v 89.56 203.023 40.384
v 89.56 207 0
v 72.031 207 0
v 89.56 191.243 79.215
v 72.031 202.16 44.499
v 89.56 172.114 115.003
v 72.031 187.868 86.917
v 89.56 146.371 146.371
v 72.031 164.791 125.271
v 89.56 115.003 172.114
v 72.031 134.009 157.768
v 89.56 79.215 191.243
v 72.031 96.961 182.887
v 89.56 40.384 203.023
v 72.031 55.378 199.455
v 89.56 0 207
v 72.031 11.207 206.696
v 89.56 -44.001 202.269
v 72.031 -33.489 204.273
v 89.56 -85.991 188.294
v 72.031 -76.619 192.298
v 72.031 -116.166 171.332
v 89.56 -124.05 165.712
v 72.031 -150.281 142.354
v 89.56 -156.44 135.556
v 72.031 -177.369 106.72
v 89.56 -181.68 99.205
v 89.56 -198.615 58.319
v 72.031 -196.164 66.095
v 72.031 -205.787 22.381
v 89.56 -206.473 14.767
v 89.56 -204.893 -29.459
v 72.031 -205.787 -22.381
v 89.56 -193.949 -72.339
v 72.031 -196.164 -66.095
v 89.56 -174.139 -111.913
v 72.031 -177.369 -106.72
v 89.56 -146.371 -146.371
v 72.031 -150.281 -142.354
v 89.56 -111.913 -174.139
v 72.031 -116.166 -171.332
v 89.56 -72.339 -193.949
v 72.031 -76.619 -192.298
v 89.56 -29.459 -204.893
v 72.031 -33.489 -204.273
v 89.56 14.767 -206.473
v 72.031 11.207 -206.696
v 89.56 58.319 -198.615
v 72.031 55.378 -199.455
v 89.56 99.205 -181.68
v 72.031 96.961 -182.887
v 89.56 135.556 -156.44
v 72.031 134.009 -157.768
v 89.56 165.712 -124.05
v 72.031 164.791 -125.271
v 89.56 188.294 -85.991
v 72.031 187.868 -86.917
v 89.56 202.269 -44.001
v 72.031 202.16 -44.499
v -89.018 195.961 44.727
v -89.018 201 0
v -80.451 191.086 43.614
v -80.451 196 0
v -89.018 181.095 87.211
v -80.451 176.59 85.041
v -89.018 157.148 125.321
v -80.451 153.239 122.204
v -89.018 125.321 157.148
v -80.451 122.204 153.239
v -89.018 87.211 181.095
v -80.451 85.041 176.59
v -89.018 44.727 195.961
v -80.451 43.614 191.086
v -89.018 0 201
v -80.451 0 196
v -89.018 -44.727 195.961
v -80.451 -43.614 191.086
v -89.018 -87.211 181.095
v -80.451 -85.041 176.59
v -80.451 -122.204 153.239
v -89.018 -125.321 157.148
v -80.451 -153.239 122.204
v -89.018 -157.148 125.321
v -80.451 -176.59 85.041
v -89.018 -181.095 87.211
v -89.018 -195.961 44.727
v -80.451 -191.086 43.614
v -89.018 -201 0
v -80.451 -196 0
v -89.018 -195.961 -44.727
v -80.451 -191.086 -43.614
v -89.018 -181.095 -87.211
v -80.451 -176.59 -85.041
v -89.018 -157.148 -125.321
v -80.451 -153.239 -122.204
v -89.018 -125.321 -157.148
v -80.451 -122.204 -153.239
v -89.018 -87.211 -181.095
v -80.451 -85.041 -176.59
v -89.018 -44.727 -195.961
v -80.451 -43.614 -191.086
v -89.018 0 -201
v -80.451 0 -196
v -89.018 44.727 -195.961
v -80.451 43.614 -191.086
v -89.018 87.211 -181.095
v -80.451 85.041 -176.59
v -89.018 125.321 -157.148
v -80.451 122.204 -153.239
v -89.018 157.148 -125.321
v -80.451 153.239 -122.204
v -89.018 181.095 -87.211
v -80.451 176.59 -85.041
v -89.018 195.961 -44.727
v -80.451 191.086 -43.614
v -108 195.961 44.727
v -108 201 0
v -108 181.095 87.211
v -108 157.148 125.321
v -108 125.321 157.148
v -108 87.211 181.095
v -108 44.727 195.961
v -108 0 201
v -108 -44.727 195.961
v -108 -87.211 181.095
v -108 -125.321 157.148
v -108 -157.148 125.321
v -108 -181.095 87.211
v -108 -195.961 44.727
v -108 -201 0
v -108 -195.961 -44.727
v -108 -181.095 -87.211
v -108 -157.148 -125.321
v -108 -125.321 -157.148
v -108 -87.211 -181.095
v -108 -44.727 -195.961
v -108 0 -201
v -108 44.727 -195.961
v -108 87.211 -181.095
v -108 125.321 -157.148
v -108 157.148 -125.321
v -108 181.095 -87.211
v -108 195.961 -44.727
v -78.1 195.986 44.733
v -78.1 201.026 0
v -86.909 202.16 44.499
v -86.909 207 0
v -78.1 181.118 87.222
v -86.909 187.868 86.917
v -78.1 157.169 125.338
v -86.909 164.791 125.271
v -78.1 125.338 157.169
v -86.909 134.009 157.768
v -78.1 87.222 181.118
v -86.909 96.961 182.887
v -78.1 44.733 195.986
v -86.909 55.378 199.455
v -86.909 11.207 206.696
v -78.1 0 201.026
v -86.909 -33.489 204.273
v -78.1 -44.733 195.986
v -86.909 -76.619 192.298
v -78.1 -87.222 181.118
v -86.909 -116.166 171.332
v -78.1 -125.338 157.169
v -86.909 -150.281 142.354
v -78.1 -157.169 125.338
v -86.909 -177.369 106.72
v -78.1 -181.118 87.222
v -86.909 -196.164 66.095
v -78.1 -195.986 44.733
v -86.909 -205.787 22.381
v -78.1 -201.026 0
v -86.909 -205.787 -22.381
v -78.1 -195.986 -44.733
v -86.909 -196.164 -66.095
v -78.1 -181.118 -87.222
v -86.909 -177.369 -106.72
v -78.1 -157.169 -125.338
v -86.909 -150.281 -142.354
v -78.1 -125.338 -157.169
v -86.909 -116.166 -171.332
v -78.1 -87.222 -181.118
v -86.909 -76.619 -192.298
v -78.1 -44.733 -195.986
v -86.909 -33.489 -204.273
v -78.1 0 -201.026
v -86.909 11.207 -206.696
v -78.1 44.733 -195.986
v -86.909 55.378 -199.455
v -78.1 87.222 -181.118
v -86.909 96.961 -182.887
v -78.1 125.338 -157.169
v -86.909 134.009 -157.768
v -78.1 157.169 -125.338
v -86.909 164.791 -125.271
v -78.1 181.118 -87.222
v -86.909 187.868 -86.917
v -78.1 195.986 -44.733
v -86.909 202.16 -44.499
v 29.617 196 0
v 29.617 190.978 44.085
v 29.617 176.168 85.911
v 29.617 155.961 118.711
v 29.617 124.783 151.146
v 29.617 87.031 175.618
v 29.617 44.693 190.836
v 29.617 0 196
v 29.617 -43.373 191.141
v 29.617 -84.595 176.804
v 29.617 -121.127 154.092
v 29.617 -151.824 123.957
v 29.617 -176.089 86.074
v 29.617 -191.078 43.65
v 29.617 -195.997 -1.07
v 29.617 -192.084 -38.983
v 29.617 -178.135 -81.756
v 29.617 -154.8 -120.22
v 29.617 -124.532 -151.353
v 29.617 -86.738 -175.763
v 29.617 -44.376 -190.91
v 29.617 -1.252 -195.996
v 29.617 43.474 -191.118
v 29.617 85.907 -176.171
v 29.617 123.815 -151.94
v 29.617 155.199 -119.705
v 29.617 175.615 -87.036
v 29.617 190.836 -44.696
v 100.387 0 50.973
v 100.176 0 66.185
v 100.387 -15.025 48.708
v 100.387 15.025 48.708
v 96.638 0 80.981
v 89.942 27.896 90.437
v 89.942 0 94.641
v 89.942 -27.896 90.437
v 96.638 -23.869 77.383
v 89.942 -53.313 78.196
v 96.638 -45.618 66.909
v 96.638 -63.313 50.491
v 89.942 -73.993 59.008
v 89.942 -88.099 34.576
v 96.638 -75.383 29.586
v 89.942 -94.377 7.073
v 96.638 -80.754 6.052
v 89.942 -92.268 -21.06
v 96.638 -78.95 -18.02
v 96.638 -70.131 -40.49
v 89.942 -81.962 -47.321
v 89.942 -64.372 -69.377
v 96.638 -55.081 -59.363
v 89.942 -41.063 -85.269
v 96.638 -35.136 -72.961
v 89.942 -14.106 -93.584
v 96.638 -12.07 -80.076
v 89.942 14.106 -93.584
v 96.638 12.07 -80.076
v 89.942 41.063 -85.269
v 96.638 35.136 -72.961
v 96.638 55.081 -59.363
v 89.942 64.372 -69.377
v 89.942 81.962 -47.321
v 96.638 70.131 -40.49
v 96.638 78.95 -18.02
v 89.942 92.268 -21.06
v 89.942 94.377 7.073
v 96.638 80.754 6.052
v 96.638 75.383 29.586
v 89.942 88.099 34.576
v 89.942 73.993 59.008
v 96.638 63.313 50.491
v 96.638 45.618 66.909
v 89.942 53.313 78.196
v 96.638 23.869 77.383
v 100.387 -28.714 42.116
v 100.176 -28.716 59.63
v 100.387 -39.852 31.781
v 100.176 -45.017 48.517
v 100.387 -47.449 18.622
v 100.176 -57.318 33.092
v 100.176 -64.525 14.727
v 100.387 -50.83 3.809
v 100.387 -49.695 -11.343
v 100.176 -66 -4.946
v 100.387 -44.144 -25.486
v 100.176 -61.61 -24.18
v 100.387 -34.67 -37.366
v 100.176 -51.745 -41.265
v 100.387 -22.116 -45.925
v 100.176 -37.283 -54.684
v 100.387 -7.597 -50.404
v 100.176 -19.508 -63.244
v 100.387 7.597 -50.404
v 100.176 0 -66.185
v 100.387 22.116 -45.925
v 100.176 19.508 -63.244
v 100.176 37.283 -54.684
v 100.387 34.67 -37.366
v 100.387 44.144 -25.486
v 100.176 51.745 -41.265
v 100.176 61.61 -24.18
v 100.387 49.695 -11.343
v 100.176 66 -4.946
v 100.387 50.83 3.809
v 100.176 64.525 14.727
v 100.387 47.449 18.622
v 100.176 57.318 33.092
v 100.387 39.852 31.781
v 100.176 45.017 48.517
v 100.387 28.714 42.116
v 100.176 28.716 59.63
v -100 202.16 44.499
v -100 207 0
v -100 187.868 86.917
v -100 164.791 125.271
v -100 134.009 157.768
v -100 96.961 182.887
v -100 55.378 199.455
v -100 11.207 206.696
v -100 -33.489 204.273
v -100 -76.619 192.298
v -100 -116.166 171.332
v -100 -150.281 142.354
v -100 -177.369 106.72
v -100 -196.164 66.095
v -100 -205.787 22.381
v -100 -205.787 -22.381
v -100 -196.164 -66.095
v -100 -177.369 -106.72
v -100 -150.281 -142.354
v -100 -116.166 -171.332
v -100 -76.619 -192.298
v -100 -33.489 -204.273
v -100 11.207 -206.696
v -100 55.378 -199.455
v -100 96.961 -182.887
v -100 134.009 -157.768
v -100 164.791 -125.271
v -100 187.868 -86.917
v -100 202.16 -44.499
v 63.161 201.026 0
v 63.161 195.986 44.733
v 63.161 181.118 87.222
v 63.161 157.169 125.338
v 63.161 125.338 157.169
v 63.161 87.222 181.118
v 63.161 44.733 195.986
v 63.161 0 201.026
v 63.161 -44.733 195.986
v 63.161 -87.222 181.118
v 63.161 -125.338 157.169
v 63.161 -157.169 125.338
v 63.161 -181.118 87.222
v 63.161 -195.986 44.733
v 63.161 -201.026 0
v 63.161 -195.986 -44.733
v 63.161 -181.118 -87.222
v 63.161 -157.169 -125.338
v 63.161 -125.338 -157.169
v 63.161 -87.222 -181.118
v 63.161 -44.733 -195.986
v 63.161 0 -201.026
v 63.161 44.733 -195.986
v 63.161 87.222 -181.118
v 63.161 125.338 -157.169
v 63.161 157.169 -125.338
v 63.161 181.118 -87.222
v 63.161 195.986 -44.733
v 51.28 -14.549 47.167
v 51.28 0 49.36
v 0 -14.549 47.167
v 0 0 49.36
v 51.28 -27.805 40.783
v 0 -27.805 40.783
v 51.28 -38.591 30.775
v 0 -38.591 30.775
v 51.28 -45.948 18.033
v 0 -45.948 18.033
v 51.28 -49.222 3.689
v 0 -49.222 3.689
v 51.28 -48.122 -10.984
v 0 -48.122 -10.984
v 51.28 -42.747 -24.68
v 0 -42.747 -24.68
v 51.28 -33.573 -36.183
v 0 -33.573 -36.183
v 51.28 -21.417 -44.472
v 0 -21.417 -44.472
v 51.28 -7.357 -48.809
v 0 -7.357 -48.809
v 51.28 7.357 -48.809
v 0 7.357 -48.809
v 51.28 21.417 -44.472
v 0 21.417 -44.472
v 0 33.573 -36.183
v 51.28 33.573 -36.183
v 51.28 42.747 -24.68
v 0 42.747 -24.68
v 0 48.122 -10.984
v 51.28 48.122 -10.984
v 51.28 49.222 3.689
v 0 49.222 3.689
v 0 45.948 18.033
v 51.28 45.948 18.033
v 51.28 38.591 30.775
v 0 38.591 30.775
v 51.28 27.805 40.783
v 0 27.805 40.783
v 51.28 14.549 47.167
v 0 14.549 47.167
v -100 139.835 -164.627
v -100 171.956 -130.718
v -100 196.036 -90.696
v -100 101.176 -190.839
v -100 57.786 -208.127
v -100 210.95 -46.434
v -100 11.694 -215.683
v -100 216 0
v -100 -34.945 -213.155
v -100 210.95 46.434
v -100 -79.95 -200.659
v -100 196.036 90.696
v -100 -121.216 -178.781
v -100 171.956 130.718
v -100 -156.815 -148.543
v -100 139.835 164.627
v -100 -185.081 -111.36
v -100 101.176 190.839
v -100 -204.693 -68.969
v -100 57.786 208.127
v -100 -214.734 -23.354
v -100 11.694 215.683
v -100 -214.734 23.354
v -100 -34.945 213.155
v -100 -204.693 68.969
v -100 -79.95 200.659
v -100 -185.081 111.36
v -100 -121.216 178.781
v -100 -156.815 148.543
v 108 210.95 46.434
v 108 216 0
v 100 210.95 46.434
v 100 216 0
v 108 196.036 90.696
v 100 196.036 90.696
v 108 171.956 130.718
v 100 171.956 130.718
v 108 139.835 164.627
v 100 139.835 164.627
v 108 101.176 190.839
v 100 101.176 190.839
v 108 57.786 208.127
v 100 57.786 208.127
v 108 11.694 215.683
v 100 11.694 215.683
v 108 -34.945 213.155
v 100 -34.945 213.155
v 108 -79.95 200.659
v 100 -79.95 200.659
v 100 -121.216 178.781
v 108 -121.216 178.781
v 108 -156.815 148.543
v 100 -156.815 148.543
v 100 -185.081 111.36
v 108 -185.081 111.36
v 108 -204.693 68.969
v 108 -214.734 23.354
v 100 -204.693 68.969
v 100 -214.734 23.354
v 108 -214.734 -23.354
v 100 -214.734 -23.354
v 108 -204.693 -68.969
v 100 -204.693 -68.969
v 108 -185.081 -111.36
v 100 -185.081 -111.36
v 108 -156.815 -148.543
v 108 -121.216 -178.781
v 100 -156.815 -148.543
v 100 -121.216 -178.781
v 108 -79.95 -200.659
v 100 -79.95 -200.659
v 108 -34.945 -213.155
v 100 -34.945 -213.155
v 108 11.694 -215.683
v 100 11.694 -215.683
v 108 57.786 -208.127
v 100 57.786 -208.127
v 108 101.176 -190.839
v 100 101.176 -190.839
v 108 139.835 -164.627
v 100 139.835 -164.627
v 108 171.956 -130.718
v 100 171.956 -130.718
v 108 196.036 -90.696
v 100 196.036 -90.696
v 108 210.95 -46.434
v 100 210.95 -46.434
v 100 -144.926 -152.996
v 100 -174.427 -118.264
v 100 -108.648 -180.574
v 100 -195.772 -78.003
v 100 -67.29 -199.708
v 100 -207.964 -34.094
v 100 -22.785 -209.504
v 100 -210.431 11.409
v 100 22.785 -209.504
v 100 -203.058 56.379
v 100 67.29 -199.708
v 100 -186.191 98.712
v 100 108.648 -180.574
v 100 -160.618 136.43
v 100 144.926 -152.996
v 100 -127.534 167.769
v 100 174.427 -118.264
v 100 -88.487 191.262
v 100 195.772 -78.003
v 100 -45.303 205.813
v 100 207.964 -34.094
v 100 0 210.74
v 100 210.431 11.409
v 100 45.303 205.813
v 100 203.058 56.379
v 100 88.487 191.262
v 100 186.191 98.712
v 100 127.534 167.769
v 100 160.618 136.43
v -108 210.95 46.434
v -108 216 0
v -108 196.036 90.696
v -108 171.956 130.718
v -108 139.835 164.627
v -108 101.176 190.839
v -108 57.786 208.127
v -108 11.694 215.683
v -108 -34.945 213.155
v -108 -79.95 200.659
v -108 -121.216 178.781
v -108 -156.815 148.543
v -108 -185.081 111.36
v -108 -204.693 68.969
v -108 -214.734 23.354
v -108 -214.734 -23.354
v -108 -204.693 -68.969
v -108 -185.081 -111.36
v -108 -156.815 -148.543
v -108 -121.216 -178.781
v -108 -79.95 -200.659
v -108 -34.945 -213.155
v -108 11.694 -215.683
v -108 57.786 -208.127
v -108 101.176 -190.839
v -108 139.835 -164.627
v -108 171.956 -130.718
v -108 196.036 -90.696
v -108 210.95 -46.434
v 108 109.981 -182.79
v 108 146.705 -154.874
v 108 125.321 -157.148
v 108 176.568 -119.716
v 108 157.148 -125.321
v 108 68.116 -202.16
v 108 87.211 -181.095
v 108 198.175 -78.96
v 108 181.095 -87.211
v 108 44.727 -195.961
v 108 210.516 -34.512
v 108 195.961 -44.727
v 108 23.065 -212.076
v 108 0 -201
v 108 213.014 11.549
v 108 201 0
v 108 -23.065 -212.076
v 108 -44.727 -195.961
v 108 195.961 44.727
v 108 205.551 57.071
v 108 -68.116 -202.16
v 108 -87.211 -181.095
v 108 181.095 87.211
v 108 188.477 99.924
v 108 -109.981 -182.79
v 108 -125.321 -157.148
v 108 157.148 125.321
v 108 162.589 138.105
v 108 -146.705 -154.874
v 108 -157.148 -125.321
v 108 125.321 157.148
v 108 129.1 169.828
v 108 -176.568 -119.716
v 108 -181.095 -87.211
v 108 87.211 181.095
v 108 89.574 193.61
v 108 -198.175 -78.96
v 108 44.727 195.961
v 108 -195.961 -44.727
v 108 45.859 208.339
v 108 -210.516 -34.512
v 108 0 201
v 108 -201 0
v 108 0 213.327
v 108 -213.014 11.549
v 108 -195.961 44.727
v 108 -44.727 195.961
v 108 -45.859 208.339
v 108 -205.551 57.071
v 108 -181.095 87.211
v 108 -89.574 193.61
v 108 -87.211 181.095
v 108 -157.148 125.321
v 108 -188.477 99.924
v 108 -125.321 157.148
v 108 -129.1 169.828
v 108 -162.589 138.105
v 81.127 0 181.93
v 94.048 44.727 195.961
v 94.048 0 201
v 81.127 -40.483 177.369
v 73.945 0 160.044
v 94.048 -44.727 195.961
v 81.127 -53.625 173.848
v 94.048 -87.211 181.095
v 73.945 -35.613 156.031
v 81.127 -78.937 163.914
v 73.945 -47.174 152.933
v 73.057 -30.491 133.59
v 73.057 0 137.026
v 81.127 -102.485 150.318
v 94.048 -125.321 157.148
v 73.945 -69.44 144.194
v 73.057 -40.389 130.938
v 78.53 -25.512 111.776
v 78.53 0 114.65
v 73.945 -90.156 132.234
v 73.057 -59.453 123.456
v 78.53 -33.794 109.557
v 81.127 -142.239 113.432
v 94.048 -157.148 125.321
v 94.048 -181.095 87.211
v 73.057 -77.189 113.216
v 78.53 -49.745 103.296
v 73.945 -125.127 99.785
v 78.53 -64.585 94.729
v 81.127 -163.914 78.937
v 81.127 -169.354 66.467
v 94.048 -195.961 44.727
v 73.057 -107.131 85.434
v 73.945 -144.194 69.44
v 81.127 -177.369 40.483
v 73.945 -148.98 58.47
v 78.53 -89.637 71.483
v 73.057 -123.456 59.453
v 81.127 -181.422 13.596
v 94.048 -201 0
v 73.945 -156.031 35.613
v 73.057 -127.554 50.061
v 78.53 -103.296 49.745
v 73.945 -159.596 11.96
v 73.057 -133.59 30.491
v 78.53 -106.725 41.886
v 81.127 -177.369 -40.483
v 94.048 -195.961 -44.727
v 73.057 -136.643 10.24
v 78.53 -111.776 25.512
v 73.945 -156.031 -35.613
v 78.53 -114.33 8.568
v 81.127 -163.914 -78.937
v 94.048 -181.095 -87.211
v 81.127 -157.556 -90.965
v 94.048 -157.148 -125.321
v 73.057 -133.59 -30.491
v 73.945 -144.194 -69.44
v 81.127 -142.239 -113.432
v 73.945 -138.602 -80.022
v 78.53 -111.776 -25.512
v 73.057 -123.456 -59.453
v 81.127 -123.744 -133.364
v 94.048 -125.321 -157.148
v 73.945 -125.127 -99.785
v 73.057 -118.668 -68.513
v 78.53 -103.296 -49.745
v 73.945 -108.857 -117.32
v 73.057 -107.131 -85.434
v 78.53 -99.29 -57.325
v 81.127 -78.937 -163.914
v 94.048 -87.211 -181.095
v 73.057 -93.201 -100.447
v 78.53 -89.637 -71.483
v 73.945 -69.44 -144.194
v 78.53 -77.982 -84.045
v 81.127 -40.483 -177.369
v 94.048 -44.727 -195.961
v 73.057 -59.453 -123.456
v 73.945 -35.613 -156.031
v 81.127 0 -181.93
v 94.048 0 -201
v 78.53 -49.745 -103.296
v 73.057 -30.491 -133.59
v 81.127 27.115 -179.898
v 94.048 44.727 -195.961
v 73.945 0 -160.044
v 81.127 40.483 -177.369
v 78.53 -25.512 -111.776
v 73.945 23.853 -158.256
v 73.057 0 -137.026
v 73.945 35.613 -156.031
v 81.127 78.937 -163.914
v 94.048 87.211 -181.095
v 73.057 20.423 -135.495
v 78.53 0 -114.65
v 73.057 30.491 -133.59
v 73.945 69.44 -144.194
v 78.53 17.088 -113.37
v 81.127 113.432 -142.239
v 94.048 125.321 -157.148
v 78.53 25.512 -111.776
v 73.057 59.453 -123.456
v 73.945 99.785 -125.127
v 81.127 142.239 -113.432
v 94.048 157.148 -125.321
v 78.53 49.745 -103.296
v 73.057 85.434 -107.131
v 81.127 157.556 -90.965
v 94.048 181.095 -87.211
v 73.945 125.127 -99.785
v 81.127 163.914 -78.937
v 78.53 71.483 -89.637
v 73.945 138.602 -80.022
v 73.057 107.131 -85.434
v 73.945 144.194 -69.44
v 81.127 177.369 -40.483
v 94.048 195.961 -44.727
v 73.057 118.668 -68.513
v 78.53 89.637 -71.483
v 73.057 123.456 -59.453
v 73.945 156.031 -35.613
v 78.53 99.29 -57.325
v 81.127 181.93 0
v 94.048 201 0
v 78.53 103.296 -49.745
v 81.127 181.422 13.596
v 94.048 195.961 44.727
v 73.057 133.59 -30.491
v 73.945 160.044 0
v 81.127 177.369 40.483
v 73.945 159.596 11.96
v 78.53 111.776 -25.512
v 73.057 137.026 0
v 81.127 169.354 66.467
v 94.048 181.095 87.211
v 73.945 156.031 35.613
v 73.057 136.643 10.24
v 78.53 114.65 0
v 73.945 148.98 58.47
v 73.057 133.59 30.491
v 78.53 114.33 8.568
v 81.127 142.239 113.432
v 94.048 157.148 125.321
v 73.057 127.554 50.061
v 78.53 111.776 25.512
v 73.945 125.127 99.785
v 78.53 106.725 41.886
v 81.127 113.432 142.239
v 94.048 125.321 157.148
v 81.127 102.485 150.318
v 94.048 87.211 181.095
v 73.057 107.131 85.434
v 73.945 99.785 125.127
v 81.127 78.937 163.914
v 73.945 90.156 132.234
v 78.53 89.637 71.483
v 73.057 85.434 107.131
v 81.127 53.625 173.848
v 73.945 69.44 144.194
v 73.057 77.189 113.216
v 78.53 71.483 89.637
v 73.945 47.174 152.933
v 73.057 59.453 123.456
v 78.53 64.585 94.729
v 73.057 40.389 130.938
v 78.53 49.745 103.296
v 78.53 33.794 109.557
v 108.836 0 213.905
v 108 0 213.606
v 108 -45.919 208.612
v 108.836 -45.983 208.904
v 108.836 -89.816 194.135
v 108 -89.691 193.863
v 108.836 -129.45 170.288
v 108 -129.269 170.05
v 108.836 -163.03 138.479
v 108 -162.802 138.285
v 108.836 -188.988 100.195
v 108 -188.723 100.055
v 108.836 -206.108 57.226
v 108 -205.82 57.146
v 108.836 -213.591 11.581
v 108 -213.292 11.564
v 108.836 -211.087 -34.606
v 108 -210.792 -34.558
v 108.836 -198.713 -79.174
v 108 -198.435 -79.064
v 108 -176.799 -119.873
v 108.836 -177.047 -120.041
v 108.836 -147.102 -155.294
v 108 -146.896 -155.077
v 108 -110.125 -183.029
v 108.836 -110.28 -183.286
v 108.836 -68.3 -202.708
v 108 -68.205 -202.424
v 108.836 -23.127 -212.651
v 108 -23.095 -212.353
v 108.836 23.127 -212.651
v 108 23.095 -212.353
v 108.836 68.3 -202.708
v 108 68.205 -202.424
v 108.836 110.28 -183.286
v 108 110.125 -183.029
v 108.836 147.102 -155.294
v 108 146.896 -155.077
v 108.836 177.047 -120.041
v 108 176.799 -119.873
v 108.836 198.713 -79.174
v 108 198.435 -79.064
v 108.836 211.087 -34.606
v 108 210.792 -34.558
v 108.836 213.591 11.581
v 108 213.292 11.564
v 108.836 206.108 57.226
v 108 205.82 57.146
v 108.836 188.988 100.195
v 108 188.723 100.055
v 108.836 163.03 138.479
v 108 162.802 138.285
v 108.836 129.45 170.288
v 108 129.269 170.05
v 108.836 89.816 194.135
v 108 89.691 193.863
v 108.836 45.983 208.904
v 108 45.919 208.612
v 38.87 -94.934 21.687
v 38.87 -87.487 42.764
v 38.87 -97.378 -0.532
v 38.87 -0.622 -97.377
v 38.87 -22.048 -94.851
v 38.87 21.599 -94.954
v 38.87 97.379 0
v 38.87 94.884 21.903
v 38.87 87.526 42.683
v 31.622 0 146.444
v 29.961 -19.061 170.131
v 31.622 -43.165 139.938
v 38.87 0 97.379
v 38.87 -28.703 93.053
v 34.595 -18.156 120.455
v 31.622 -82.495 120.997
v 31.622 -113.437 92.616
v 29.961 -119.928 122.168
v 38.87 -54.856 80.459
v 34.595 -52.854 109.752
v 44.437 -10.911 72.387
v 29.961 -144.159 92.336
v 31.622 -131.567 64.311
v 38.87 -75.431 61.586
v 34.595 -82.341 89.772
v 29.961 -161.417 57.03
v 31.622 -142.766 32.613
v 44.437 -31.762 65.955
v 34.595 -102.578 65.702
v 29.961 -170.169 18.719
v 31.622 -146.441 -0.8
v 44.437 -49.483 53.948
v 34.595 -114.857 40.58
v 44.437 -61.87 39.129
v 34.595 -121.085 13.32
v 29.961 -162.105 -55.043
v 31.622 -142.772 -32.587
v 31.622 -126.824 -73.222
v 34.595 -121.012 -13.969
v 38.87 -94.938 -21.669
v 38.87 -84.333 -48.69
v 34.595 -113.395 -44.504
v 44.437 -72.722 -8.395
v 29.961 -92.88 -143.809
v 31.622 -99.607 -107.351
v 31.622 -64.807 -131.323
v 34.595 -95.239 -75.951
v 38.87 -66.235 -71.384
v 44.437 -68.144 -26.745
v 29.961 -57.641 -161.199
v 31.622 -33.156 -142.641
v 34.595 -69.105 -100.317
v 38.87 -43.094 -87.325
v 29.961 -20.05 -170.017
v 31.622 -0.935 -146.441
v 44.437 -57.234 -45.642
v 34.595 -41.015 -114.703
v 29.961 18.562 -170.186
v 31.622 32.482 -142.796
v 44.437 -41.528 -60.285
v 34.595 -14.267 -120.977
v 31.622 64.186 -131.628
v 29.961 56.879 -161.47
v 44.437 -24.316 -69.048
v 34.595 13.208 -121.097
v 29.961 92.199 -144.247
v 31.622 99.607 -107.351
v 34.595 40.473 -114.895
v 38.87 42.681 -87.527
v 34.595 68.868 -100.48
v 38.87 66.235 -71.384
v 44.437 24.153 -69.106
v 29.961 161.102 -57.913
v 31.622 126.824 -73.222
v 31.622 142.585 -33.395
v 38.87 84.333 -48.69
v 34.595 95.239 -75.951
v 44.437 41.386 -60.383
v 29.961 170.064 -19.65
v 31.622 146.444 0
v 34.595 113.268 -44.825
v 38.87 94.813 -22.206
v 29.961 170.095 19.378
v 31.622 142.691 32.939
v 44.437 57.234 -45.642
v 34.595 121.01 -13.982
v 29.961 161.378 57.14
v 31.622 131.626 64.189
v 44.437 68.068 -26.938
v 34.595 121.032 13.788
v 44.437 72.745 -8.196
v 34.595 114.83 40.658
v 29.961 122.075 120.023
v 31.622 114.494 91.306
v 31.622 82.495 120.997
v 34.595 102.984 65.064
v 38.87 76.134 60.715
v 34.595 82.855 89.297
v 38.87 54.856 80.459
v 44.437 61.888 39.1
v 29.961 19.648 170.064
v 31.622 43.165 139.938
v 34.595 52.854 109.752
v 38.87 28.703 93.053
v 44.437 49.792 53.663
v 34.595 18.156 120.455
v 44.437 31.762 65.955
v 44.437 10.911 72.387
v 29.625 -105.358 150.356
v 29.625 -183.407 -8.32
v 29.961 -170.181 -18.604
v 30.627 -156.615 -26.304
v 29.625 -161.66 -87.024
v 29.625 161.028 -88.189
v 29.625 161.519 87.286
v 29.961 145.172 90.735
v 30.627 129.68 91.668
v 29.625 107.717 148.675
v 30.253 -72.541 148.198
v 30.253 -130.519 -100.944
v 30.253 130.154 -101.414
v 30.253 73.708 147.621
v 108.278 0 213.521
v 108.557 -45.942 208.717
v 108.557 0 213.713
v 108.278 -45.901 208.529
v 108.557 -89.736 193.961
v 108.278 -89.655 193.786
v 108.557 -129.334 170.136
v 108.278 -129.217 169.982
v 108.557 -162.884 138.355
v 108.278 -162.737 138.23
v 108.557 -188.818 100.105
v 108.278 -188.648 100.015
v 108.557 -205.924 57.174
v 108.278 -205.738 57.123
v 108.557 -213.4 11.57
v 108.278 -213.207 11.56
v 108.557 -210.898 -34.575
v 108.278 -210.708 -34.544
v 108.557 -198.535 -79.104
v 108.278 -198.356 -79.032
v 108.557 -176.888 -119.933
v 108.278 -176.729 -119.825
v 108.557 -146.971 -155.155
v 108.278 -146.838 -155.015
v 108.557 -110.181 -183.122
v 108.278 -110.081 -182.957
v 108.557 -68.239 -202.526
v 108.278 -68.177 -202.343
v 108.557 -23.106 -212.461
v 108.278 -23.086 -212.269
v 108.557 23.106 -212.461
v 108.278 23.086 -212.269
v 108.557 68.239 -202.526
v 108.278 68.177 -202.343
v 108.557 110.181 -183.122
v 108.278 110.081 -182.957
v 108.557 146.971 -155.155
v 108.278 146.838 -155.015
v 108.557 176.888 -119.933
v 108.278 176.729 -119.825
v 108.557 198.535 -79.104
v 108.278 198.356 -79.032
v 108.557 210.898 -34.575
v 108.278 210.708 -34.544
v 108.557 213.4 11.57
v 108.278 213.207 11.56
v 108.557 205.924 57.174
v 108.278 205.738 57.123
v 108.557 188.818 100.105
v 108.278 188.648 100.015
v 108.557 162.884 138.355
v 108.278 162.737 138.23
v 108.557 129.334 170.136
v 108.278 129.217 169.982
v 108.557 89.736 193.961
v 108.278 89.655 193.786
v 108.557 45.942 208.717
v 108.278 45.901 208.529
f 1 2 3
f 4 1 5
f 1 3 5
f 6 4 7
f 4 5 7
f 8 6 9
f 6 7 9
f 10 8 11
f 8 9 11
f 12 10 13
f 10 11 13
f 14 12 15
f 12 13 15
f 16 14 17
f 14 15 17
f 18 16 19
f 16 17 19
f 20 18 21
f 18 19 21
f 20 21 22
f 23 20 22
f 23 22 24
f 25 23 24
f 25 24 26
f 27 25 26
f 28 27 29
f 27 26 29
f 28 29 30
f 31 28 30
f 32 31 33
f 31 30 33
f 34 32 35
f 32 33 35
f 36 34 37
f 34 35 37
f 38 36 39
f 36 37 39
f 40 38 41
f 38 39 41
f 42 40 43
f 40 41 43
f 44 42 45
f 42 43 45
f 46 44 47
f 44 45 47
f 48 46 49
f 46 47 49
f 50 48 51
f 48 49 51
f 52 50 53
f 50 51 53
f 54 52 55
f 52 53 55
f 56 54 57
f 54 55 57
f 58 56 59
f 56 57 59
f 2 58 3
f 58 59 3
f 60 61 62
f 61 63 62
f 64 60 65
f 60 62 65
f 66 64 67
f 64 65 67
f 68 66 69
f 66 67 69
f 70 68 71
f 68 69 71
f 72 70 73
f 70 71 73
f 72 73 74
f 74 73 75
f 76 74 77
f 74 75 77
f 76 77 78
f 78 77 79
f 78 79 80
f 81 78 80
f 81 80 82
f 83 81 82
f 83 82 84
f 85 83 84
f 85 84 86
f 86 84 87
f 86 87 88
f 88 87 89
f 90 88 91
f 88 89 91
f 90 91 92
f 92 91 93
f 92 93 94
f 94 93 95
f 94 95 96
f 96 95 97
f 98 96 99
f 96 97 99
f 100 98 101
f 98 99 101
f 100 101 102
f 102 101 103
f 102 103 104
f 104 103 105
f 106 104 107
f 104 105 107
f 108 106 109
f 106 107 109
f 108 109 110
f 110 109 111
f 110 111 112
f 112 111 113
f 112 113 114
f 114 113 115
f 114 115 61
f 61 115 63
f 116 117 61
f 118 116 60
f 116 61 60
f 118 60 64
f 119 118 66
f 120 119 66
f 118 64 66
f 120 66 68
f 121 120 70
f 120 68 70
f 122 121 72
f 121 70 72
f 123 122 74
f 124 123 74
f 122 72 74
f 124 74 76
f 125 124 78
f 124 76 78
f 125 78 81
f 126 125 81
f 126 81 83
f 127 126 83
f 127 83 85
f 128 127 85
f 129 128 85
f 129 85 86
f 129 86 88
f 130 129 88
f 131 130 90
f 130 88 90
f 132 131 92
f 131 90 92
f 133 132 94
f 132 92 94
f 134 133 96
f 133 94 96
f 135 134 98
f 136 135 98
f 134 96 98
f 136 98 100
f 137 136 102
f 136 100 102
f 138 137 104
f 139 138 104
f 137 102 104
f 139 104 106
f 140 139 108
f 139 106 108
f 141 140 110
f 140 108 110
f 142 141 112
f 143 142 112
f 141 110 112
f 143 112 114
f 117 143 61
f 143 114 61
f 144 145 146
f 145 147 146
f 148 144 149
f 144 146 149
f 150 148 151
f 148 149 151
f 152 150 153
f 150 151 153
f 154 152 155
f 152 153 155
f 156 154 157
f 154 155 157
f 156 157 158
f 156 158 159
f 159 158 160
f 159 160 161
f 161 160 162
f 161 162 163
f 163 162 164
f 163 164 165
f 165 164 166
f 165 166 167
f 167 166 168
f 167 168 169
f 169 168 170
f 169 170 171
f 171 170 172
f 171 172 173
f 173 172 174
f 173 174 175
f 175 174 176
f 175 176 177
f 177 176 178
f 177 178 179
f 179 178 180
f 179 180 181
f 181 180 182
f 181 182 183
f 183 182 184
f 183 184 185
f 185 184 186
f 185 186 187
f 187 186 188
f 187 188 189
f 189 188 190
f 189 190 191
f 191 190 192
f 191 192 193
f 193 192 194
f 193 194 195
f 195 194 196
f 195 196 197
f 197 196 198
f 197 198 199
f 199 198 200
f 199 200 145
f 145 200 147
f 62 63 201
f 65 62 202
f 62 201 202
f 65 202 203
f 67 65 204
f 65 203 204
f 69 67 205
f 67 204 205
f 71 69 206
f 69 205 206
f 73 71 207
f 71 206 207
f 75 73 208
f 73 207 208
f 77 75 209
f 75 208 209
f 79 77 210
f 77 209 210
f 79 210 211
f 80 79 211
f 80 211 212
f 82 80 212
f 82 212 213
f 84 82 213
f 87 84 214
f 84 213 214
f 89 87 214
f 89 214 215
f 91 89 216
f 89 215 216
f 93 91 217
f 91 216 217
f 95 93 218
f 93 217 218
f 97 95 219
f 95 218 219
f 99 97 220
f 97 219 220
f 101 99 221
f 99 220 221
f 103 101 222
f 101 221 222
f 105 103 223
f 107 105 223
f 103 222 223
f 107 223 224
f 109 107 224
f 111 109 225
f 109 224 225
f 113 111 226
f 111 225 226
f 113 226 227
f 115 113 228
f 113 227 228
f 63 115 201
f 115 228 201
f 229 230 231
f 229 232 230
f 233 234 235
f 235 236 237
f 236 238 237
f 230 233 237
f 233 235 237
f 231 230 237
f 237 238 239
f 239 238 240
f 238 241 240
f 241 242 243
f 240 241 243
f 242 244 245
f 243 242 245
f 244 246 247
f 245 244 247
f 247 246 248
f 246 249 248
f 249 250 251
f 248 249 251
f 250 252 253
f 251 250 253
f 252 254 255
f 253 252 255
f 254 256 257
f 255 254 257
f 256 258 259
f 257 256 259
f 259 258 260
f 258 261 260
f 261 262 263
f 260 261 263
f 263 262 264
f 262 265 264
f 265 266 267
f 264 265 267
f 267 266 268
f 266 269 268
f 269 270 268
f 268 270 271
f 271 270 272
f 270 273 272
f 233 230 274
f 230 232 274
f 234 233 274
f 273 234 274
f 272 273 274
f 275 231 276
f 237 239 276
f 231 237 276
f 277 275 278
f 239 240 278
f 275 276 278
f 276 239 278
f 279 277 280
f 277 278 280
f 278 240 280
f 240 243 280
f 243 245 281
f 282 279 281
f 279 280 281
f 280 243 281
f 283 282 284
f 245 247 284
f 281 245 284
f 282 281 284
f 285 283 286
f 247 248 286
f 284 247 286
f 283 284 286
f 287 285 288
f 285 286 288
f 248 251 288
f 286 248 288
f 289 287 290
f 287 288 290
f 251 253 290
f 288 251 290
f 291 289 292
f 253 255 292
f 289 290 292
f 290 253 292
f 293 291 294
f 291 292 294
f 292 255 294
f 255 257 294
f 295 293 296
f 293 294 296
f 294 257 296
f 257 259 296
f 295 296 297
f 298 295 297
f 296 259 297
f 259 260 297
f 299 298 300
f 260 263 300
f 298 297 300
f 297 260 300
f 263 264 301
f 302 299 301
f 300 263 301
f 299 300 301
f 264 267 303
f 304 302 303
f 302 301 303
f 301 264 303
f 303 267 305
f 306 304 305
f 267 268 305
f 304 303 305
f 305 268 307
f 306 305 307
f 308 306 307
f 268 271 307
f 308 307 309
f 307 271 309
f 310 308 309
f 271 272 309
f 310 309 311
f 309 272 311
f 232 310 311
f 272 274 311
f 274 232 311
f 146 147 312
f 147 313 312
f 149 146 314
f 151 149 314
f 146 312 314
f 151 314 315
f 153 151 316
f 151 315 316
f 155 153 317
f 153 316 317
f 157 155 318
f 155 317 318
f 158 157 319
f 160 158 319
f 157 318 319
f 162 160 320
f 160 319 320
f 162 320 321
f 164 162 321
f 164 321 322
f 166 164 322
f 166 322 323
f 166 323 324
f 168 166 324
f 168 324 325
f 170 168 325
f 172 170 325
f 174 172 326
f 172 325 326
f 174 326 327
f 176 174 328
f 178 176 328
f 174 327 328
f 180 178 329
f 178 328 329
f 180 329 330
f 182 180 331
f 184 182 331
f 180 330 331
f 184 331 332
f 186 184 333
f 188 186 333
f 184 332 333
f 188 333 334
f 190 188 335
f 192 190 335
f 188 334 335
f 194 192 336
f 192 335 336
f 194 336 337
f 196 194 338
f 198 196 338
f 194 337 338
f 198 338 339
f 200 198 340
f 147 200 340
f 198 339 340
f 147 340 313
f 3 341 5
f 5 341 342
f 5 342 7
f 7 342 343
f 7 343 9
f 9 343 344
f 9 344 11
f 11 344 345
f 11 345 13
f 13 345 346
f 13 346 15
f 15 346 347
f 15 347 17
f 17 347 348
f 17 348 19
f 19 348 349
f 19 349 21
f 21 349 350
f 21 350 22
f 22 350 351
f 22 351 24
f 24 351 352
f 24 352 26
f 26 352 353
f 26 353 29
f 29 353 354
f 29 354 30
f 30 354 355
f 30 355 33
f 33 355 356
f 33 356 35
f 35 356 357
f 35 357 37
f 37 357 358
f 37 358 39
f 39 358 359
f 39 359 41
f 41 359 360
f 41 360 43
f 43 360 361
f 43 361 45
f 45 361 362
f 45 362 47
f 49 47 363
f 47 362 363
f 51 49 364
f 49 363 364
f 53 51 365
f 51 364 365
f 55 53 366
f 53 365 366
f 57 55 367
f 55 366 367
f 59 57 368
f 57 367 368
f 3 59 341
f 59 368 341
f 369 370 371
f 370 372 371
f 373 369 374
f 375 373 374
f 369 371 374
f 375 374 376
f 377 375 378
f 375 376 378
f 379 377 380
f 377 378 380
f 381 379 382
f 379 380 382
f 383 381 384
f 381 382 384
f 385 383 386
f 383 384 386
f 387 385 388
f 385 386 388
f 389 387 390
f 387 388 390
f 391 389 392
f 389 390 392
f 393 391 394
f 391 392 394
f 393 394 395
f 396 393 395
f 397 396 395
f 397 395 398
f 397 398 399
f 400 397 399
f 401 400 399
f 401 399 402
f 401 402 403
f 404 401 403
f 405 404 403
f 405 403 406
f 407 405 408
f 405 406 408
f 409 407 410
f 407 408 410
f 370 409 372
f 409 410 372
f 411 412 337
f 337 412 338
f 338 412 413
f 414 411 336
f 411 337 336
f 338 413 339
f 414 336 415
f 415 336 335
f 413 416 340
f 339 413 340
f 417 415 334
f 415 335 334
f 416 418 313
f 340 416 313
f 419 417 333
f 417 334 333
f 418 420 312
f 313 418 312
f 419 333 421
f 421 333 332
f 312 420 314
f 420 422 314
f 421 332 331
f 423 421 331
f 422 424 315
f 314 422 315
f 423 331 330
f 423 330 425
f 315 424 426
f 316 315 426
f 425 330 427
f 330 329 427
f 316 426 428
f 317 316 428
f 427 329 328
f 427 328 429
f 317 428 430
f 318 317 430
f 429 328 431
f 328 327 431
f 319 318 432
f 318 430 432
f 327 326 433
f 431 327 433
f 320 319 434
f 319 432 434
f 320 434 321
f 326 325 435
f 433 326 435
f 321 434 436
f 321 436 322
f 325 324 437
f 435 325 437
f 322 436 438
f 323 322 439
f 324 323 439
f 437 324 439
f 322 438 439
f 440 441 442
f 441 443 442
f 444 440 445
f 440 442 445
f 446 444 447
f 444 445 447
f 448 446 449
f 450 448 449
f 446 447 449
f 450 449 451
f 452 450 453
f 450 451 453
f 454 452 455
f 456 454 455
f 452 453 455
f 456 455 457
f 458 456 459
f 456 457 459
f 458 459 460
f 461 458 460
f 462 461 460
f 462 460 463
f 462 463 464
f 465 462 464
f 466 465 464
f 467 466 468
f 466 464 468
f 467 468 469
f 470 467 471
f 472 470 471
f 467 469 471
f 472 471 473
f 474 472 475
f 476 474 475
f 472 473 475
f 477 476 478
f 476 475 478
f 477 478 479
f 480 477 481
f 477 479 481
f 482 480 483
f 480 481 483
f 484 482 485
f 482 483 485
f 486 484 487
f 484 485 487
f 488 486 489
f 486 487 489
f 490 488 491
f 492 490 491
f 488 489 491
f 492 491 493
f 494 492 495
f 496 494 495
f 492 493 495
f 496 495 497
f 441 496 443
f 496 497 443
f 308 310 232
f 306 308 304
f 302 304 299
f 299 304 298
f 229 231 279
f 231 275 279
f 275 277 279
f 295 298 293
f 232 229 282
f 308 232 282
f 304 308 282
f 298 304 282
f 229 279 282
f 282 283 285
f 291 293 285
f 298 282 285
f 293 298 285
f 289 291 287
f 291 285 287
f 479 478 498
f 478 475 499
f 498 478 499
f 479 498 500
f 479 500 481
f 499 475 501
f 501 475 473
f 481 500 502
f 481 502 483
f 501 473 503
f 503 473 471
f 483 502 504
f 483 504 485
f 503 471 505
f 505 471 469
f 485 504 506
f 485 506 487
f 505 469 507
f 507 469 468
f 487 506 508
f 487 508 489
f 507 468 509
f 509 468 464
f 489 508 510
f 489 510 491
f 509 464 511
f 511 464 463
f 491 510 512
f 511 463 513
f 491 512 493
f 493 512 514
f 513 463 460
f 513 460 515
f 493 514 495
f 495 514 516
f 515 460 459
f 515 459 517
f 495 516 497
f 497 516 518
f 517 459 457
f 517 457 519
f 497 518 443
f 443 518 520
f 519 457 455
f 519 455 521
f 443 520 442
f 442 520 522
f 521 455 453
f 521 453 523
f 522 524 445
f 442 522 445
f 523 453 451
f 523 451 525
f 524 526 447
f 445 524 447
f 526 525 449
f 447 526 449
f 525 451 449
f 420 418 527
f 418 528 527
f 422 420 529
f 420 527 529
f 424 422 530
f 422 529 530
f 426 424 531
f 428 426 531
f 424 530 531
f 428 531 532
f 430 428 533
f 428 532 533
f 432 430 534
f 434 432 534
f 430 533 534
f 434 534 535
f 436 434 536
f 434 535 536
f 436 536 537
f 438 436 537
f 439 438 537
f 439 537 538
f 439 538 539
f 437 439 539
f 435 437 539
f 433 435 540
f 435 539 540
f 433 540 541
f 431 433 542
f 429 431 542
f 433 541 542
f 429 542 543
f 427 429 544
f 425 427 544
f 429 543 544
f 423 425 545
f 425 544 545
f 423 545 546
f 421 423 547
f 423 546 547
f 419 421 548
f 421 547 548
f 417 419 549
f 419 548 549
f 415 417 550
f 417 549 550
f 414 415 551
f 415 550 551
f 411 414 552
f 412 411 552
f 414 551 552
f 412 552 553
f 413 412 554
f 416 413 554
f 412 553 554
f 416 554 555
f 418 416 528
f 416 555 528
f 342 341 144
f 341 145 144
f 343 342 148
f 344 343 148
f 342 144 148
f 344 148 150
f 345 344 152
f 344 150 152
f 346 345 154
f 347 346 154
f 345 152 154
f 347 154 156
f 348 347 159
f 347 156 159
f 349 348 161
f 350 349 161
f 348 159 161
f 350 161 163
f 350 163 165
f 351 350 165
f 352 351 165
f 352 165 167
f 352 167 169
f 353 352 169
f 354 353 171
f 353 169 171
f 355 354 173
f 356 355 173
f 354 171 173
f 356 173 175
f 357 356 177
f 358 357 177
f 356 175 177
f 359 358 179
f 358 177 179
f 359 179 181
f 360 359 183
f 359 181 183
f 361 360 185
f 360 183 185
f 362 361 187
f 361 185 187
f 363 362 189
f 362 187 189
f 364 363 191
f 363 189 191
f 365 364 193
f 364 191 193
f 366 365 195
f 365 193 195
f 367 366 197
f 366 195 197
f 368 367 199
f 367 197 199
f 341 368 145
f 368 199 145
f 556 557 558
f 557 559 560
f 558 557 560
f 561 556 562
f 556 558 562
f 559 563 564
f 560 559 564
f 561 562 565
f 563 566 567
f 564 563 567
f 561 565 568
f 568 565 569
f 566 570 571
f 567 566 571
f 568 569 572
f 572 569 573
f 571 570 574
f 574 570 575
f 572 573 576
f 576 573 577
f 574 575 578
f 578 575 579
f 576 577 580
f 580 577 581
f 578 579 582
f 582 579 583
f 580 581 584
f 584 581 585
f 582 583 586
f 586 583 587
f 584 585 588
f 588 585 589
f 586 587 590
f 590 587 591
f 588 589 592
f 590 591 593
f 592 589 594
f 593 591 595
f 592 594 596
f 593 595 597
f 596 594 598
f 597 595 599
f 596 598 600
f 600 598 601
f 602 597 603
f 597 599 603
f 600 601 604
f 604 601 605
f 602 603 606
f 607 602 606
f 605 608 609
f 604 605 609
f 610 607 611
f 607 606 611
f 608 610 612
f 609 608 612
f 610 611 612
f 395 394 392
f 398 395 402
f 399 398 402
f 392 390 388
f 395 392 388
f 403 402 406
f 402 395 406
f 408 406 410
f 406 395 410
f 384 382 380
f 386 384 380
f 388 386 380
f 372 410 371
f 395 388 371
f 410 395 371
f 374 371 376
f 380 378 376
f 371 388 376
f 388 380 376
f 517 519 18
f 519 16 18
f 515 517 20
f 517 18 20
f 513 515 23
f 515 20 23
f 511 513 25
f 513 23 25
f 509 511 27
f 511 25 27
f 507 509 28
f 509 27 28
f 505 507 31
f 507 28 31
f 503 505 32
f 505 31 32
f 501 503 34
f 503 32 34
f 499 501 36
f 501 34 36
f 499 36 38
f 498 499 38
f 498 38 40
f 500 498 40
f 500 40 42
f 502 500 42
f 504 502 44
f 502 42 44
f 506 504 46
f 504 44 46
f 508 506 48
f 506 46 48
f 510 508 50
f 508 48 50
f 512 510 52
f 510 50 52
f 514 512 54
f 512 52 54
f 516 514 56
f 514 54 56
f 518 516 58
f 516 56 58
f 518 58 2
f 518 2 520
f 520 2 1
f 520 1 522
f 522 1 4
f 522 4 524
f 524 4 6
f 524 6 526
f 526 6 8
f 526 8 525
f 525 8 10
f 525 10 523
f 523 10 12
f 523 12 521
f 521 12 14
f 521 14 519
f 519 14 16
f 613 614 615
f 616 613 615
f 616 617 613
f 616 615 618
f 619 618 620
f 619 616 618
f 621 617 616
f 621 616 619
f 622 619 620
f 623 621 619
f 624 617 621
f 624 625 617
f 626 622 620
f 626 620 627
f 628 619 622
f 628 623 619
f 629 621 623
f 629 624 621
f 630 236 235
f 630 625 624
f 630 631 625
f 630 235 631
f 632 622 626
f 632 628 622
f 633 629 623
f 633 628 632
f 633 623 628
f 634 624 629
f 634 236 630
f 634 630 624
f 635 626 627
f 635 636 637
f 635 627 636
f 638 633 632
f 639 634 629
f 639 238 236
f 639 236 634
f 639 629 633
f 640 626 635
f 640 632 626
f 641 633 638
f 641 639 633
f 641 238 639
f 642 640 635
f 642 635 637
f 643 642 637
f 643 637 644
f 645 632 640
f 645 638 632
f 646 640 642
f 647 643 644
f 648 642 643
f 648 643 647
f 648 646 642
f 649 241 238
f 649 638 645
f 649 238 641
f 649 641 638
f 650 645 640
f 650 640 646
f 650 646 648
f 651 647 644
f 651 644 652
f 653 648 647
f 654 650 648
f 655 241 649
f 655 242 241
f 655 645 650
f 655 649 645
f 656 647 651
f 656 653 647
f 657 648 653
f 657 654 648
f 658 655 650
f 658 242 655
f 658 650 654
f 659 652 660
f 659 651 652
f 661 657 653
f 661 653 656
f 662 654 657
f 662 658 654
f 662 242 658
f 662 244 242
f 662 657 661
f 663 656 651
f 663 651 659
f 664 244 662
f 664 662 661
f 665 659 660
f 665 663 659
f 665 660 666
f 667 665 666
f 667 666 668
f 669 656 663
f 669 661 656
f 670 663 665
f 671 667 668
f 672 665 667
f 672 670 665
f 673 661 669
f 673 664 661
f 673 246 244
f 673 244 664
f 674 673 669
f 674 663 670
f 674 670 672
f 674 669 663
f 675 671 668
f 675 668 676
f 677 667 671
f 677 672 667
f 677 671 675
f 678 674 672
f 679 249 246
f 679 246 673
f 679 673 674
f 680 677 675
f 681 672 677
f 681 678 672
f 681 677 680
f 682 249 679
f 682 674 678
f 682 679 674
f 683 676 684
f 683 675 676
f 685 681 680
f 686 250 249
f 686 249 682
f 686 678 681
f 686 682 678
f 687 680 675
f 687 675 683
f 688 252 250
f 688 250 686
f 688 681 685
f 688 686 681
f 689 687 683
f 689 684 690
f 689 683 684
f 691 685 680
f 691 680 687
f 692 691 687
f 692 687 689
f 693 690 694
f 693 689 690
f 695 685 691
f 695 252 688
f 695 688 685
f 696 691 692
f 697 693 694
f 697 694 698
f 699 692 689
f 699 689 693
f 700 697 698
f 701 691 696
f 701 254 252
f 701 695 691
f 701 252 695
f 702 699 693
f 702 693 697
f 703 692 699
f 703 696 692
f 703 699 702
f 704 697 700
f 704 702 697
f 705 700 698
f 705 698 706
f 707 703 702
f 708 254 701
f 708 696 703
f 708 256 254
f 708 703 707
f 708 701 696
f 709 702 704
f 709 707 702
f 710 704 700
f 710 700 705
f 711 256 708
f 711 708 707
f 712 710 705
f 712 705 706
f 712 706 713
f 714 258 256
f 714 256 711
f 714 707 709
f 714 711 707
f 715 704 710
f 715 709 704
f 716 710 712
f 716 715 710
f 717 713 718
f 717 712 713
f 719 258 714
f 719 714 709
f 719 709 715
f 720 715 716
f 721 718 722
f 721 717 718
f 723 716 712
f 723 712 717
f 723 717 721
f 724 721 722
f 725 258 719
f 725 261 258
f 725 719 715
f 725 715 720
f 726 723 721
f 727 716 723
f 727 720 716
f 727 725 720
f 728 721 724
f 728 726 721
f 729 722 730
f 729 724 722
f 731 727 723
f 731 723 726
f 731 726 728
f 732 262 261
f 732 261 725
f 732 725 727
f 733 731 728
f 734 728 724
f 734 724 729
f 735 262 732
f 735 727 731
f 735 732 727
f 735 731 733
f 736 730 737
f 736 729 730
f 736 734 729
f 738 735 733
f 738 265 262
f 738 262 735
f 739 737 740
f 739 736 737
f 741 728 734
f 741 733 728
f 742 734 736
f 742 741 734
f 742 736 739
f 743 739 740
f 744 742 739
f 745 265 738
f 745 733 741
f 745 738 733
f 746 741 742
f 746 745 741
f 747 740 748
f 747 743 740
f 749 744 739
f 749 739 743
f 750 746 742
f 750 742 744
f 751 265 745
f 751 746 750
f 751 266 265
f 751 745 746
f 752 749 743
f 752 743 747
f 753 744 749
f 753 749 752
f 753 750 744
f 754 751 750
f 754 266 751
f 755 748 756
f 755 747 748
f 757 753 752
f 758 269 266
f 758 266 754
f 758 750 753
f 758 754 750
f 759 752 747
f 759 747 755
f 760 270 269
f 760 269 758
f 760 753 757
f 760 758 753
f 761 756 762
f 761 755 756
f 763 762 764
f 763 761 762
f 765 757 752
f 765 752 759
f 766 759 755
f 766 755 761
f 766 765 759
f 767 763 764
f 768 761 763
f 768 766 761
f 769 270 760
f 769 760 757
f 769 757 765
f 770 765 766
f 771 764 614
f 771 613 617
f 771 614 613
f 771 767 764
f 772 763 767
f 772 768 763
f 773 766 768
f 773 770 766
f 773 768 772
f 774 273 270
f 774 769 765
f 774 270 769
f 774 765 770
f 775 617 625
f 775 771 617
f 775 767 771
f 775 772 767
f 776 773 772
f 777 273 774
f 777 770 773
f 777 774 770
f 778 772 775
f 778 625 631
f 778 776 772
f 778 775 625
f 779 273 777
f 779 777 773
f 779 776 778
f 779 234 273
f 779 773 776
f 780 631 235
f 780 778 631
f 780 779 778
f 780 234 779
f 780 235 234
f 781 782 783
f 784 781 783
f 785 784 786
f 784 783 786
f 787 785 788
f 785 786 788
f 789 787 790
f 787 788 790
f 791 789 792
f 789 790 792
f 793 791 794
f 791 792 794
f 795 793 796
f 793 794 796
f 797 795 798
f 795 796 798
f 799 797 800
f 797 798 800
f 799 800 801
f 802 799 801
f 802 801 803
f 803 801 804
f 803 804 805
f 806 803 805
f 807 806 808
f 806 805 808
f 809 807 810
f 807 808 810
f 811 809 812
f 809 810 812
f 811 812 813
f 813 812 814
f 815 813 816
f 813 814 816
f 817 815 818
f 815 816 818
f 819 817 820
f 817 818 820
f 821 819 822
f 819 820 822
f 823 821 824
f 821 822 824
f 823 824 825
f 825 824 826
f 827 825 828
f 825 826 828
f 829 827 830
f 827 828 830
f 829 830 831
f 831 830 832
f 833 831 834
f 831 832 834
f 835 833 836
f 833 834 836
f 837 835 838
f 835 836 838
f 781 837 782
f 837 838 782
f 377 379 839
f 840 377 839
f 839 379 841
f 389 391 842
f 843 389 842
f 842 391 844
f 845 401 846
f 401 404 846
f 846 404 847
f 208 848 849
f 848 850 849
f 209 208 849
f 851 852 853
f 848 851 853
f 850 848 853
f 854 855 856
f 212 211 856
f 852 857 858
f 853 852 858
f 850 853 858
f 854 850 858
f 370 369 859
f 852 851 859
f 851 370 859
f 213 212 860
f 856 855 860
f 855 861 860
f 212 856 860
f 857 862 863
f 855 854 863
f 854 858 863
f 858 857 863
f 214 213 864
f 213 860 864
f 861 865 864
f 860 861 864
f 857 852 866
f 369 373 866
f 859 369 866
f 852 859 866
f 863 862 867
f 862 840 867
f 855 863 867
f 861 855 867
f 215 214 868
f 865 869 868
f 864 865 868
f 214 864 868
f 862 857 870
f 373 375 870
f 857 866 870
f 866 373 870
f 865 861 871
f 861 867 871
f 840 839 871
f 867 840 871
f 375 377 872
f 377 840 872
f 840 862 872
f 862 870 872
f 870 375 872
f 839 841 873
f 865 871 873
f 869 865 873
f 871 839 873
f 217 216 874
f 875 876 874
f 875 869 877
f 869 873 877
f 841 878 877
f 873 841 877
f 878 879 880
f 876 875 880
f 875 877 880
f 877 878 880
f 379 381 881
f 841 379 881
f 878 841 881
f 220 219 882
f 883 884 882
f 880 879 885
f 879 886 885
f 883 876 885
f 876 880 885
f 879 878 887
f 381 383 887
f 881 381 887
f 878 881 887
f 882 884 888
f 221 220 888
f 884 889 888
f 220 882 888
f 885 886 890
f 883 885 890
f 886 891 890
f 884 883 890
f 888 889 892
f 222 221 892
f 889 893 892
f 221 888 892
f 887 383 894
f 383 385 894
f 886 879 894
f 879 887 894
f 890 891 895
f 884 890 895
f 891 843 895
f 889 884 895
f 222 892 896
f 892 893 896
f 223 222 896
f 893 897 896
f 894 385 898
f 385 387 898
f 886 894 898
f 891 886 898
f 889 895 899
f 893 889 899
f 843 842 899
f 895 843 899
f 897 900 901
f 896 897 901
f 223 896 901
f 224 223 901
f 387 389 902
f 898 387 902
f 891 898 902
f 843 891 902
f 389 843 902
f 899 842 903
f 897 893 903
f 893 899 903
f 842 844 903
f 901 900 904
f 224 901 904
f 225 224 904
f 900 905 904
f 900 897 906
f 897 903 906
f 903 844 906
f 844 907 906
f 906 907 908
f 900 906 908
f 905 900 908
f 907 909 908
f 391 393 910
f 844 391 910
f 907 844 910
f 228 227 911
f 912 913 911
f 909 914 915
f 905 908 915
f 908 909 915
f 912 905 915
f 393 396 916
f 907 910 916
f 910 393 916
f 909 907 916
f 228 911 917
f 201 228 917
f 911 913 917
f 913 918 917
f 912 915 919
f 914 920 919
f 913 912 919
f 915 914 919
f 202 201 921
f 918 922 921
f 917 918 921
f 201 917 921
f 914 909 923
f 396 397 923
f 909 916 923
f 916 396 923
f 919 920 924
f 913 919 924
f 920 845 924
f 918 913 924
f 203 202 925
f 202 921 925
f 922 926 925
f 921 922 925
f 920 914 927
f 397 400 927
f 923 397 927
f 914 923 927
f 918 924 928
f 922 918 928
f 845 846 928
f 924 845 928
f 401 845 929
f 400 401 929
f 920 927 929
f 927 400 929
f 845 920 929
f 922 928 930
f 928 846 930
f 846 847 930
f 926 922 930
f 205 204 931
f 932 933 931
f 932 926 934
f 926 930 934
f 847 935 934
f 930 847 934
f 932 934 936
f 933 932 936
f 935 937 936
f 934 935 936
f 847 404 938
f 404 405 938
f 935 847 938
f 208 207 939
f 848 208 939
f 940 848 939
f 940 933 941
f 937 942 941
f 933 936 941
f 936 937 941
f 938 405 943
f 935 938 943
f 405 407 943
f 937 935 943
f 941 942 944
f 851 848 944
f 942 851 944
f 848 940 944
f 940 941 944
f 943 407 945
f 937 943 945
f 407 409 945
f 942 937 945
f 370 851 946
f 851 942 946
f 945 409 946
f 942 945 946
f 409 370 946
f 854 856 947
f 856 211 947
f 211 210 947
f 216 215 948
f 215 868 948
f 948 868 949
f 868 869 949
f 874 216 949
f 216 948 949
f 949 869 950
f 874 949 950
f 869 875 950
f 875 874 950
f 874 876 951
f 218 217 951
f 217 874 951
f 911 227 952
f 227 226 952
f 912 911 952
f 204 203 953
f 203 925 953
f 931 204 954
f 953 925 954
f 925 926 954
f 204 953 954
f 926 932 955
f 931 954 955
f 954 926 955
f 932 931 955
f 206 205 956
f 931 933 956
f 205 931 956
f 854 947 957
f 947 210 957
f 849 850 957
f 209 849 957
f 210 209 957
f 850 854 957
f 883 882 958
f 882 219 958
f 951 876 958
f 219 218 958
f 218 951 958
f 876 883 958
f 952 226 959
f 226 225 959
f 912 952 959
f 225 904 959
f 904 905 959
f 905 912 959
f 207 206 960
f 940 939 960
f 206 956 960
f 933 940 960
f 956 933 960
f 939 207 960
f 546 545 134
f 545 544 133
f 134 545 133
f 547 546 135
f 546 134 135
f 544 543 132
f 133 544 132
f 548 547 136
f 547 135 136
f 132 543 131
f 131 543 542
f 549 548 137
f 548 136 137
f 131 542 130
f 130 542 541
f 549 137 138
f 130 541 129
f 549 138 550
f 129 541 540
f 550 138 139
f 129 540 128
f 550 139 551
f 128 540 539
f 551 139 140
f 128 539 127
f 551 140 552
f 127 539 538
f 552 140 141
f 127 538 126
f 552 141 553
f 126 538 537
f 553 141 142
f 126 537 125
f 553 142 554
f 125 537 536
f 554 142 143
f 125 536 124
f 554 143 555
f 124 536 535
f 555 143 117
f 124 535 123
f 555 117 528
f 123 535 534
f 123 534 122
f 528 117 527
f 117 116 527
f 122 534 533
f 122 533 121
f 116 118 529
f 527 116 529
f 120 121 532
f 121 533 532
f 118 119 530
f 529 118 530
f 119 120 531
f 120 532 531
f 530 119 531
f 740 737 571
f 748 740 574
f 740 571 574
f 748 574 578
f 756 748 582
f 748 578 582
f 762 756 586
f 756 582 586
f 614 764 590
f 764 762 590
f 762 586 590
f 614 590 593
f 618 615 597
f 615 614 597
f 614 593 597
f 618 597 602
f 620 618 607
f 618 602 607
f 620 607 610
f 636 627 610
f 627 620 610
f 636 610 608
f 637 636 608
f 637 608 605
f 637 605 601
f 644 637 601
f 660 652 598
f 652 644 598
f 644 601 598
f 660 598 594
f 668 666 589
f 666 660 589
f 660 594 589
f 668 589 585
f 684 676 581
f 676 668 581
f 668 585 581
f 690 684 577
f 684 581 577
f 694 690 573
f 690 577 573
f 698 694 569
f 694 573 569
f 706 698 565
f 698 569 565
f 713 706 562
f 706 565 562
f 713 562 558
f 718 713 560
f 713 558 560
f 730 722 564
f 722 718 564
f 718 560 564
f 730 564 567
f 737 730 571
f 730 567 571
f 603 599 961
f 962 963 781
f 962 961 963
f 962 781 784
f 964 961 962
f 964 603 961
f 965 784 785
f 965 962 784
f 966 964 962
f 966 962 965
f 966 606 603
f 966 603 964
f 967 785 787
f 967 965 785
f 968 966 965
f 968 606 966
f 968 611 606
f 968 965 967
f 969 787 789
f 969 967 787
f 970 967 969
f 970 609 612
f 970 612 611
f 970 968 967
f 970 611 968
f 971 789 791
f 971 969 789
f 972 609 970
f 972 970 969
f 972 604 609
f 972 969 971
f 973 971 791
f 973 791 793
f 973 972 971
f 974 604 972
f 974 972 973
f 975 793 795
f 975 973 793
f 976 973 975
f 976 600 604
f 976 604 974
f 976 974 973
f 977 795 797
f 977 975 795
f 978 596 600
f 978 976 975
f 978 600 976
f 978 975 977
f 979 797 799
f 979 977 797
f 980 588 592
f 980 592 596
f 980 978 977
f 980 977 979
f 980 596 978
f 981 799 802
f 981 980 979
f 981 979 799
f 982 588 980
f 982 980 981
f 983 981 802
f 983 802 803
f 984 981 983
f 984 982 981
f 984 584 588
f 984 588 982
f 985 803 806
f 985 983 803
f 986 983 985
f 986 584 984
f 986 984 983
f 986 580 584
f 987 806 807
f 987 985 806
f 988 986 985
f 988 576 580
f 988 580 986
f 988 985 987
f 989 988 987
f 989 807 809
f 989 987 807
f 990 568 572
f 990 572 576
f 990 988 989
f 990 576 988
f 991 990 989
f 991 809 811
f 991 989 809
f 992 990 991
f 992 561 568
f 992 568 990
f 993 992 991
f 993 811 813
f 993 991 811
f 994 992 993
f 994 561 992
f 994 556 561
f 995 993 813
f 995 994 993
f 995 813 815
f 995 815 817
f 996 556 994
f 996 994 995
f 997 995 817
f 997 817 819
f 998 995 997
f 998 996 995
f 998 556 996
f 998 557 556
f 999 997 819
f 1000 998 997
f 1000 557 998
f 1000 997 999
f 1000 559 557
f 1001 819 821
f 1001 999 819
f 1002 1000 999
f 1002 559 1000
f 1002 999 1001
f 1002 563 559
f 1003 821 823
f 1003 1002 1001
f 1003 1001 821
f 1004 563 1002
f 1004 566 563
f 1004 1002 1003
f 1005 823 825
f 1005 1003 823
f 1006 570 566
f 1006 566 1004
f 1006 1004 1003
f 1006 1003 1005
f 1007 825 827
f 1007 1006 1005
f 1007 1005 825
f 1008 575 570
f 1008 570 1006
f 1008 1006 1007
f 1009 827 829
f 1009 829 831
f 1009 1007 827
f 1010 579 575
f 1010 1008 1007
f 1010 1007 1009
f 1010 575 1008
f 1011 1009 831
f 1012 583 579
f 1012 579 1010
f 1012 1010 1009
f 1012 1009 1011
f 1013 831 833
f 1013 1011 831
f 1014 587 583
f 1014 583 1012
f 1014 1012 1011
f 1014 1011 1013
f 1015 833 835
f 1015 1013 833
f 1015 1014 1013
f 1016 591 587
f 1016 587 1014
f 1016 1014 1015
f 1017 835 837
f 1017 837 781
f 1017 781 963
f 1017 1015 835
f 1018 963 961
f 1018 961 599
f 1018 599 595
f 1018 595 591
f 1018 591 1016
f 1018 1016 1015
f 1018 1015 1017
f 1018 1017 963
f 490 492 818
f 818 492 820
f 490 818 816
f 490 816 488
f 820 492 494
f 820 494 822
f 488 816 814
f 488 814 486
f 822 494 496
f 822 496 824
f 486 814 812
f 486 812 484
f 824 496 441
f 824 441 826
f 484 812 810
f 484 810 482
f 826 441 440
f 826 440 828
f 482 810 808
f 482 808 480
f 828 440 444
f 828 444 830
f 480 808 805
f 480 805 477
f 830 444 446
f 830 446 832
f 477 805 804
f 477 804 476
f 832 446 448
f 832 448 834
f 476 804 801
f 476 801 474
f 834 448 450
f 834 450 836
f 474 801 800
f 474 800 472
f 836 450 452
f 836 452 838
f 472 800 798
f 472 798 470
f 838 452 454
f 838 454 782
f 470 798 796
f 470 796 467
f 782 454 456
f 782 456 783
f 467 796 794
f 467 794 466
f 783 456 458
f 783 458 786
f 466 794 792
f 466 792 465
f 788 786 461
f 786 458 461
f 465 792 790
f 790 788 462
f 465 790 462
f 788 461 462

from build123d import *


with BuildPart() as part:
    # Sketch → Revolution (revolve)
    with BuildSketch(Plane.XY):
        Polygon((-28.515713, 196), (28.515713, 196), (65.398537, 196), (73.283608, 201), (108, 201), (108, 216), (100, 216), (100, 207), (72.030521, 207), (63.161045, 201.026306), (-29.824583, 201.026306), (-78.099873, 201.026306), (-86.908587, 207), (-100, 207), (-100, 216), (-108, 216), (-108, 201), (-99.298126, 201), (-89.018097, 201), (-80.451416, 196), align=None)
    revolve(axis=Axis((0, 0, 0), (1, 0, 0)))

    # Sketch001 → Revolution001 (revolve)
    with BuildSketch(Plane.XZ):
        with BuildLine():
            Line((0, 0), (100.38707, 0))
            Line((100.38707, 0), (100.38707, 50.972863))
            ThreePointArc((100.38707, 50.972863), (98.816025, 73.680404), (89.94216, 94.641203))
            ThreePointArc((108.836403, 213.905151), (73.659034, 158.34946), (89.94216, 94.641203))
            Line((108.836403, 213.905151), (62.693928, 197.37645))
            Line((62.693928, 197.37645), (29.636631, 197.37645))
            ThreePointArc((29.636631, 197.37645), (34.494433, 122.49617), (51.28, 49.36))
            Line((51.28, 49.36), (0, 49.36))
            Line((0, 49.36), (0, 0))
        make_face()
    revolve(axis=Axis((0, 0, 0), (1, 0, 0)))


solid = part.part
